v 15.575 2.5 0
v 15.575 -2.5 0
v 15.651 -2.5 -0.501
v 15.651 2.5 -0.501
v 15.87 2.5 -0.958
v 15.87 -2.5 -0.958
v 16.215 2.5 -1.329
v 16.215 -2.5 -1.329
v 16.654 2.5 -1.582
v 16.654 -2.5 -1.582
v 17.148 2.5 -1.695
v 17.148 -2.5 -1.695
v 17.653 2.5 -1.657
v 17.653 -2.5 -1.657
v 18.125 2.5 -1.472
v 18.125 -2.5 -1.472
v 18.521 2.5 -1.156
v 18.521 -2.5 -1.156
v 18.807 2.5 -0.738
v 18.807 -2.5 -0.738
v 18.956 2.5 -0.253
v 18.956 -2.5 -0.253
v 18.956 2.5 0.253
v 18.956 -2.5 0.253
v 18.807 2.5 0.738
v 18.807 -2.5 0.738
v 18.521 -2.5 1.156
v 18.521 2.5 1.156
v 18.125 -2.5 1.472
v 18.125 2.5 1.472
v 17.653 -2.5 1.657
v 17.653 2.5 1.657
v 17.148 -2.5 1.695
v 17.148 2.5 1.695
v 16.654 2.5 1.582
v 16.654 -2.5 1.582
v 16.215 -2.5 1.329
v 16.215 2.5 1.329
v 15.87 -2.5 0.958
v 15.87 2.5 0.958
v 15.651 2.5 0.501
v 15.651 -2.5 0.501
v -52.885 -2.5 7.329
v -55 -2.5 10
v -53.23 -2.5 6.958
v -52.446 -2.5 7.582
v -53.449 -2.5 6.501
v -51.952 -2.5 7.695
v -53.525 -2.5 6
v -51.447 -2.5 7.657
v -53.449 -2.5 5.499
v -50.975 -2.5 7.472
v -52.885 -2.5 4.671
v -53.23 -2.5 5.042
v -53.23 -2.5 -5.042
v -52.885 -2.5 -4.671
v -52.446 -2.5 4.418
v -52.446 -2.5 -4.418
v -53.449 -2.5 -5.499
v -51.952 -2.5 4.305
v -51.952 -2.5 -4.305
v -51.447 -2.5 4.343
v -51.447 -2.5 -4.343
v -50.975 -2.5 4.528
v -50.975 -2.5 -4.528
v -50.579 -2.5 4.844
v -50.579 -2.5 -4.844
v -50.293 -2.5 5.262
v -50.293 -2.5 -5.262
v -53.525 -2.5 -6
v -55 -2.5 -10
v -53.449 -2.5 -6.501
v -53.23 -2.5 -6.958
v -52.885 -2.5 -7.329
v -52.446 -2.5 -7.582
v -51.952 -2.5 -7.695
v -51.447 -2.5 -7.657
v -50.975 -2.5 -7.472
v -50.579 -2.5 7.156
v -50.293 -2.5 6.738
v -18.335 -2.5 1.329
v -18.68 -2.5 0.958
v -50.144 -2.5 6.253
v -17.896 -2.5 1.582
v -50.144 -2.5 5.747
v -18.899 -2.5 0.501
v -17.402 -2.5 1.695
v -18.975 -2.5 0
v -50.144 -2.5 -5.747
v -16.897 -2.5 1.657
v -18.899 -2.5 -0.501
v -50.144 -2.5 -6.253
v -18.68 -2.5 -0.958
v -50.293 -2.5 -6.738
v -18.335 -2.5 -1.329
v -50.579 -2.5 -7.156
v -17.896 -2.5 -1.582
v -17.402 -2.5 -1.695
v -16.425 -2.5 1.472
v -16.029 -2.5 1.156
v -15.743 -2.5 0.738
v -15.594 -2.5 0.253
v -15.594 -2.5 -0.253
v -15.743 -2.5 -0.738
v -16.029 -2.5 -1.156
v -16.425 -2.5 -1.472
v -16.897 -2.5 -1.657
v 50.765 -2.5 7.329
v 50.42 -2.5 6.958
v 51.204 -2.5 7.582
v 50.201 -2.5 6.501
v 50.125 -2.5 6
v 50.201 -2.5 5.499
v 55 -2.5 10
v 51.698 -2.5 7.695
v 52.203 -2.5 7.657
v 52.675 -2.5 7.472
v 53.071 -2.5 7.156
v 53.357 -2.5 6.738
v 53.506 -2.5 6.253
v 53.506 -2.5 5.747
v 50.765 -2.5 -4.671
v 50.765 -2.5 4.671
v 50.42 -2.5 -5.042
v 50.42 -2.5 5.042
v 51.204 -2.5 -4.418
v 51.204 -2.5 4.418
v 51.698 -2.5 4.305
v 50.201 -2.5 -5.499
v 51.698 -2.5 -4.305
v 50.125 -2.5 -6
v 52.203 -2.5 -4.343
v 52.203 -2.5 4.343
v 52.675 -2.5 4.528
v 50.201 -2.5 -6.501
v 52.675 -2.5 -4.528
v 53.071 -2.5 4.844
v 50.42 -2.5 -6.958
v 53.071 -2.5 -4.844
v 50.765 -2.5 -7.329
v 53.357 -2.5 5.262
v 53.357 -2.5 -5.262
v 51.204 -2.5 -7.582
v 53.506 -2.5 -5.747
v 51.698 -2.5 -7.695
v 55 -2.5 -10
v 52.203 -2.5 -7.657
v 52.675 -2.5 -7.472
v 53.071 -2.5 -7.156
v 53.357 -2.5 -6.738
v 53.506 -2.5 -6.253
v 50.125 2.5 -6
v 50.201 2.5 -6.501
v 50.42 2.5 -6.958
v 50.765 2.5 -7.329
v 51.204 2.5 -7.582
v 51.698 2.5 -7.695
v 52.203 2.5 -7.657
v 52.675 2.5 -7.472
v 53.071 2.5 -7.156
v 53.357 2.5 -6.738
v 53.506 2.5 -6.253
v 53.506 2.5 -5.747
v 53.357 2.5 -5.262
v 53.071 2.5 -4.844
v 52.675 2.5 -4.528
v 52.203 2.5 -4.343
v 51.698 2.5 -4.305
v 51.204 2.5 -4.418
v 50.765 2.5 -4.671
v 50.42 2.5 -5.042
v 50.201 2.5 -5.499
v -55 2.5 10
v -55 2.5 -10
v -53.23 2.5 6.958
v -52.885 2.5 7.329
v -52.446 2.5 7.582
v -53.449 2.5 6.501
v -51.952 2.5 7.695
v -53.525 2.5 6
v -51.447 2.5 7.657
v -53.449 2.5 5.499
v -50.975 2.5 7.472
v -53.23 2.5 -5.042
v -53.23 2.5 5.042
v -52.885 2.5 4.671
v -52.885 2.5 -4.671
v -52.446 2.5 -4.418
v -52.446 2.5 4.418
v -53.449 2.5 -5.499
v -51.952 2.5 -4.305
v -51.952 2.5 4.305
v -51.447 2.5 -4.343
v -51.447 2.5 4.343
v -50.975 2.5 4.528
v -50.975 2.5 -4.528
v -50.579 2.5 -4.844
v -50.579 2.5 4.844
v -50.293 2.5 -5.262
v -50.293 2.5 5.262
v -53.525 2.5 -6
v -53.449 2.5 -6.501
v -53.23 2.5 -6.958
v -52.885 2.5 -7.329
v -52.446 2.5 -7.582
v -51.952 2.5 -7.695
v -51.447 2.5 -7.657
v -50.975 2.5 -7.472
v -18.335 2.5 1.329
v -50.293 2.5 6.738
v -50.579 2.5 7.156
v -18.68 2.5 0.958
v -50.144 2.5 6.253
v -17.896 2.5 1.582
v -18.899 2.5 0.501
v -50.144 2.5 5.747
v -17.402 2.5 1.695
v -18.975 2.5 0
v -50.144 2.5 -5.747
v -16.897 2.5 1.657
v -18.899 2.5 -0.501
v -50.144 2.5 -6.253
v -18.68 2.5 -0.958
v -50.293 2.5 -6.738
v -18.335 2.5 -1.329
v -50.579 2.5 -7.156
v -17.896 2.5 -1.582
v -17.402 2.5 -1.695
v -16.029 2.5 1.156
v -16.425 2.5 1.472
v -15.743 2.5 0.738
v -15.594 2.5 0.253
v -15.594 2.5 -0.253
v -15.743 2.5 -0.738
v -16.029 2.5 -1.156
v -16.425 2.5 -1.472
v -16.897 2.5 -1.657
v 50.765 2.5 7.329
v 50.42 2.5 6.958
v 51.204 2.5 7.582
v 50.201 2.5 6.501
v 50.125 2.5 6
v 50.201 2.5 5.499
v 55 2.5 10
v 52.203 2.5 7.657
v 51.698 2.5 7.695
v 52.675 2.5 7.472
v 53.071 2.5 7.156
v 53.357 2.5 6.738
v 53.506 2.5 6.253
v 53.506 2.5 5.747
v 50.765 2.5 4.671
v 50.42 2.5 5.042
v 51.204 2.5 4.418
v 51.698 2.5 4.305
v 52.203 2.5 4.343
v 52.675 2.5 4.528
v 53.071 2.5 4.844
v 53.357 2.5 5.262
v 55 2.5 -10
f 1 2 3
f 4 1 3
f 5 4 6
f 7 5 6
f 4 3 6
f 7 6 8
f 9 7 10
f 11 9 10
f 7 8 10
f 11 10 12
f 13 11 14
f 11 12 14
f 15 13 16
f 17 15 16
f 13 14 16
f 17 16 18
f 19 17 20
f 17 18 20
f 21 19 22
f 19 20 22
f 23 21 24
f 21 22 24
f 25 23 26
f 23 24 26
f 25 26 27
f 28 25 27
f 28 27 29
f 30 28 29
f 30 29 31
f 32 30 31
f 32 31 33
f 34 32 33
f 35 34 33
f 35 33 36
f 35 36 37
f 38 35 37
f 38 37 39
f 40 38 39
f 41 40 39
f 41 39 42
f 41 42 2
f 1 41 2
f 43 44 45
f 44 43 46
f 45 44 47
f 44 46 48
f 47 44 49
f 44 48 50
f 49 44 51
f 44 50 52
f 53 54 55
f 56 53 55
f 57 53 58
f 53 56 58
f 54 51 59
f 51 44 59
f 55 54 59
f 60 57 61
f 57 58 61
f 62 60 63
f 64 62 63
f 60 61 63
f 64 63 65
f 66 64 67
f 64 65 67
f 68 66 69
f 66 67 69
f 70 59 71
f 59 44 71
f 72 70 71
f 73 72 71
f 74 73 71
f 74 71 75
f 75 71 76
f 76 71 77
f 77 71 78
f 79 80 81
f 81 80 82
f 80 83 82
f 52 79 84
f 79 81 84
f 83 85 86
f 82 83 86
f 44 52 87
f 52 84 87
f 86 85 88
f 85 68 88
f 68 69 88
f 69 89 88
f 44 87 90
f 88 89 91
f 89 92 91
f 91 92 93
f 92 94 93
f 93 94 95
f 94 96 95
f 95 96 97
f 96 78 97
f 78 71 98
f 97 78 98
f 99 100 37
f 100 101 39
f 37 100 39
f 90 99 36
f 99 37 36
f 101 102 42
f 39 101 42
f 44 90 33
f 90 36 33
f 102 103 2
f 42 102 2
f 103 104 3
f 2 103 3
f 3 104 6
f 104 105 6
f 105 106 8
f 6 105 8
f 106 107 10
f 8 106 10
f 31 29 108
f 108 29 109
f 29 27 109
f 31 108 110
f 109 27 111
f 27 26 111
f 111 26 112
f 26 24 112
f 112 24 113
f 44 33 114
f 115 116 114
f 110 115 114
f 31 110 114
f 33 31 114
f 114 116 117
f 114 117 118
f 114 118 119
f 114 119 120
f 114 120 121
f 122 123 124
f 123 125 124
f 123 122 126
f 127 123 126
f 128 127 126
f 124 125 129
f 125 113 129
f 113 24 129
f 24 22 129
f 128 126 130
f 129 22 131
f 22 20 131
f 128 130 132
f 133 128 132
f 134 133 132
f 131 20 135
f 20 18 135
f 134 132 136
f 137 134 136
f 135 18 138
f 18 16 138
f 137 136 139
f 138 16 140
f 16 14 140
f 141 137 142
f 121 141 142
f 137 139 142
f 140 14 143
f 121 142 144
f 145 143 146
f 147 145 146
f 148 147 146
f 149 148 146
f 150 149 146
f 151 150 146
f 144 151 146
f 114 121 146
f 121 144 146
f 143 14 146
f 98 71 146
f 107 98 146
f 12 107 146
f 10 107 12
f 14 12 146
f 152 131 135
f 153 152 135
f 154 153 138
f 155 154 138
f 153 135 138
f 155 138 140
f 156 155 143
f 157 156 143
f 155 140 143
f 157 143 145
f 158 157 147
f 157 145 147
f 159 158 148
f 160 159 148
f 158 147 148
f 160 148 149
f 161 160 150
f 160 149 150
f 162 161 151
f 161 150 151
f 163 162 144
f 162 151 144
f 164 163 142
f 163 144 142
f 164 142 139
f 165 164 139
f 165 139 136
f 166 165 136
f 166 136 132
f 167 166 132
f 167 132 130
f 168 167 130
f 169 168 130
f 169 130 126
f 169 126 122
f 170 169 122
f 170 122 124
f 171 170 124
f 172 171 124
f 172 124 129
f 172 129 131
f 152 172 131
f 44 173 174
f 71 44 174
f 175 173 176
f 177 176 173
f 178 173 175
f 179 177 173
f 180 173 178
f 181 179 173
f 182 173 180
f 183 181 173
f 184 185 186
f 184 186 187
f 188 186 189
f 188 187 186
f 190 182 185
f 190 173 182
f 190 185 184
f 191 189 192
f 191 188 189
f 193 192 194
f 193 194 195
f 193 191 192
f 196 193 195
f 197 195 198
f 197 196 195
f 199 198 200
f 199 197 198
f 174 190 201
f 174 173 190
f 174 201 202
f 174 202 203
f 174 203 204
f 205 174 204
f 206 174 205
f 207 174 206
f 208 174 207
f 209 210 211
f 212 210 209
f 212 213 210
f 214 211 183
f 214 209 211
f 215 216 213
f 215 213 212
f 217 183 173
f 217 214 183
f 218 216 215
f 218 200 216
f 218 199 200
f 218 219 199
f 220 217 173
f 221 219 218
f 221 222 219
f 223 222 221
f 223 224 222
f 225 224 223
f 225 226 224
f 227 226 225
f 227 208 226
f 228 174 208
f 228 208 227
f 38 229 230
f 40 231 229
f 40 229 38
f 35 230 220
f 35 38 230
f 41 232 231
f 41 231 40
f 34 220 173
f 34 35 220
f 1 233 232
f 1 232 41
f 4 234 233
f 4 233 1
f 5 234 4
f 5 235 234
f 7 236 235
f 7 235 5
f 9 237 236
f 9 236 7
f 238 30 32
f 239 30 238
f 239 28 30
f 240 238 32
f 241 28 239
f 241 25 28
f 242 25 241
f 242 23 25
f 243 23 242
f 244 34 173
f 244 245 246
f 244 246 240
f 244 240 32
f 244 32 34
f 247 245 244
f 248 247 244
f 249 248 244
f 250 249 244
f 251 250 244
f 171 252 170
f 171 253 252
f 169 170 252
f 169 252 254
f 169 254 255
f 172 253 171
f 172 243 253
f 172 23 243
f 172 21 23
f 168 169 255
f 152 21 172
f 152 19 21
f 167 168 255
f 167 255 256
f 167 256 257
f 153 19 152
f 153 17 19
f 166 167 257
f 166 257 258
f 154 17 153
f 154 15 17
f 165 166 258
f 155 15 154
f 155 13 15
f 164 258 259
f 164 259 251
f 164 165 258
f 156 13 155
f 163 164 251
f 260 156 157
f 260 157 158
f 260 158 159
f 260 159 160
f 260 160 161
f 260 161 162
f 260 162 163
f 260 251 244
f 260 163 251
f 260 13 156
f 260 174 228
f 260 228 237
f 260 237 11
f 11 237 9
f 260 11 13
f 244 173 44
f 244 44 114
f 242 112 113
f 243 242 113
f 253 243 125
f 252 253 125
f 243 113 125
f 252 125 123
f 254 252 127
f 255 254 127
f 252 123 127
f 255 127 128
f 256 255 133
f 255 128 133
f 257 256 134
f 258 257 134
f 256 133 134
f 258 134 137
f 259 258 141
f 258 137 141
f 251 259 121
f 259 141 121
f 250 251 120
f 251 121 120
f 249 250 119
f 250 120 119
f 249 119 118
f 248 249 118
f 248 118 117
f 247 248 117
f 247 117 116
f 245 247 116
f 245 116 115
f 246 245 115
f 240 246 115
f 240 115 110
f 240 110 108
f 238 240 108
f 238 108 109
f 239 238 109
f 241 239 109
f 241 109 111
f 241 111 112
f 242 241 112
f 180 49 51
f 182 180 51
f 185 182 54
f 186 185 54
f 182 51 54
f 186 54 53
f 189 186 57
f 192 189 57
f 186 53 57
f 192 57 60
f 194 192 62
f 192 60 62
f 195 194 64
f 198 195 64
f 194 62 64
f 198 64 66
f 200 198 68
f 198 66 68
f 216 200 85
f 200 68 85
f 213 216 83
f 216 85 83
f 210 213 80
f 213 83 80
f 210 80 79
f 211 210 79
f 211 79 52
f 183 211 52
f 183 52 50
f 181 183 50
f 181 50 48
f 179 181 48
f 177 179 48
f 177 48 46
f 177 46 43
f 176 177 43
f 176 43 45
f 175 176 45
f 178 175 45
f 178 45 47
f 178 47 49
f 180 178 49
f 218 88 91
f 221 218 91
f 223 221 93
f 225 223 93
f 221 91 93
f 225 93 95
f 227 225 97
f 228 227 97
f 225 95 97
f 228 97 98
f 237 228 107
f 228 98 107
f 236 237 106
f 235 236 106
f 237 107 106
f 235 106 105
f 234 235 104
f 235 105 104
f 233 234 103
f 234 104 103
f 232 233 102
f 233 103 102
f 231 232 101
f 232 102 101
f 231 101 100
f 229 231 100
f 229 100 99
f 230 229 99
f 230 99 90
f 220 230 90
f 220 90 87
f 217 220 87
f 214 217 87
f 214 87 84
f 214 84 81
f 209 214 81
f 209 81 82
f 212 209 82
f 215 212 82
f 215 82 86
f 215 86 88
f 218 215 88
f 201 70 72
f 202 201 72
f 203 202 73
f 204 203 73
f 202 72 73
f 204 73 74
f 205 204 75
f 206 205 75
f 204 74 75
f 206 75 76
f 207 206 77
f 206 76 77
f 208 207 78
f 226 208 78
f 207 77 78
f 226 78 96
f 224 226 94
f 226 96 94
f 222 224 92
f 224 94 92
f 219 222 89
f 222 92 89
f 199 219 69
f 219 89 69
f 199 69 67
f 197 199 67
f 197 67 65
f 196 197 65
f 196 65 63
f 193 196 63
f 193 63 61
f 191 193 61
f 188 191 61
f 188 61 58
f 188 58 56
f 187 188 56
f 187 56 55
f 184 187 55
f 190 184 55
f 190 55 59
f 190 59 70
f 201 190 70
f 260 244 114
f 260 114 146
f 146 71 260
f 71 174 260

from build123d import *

# Parameters (mm, degrees)
SKETCH1_W            = 110
SKETCH1_H            = 20
BOSS_EXTRUDE1_DEPTH  = 2.5
M3_CLEARANCE_HOLE1_D = 3.4


with BuildPart() as part:
    # Sketch1 → Boss-Extrude1 (new, symmetric)
    with BuildSketch(Plane(origin=(0, 0, 0), x_dir=(1, 0, 0), z_dir=(0, 1, 0))):
        Rectangle(SKETCH1_W, SKETCH1_H)
    extrude(amount=BOSS_EXTRUDE1_DEPTH, both=True)

    # M3 Clearance Hole1 (through all)
    with Locations(Plane(origin=(0, 2.5, 0), x_dir=(1, 0, 0), z_dir=(0, 1, 0))):
        with Locations((-17.275, 0), (-51.825, -6), (51.825, -6), (-51.825, 6), (51.825, 6), (17.275, 0)):
            Hole(M3_CLEARANCE_HOLE1_D / 2)


solid = part.part
